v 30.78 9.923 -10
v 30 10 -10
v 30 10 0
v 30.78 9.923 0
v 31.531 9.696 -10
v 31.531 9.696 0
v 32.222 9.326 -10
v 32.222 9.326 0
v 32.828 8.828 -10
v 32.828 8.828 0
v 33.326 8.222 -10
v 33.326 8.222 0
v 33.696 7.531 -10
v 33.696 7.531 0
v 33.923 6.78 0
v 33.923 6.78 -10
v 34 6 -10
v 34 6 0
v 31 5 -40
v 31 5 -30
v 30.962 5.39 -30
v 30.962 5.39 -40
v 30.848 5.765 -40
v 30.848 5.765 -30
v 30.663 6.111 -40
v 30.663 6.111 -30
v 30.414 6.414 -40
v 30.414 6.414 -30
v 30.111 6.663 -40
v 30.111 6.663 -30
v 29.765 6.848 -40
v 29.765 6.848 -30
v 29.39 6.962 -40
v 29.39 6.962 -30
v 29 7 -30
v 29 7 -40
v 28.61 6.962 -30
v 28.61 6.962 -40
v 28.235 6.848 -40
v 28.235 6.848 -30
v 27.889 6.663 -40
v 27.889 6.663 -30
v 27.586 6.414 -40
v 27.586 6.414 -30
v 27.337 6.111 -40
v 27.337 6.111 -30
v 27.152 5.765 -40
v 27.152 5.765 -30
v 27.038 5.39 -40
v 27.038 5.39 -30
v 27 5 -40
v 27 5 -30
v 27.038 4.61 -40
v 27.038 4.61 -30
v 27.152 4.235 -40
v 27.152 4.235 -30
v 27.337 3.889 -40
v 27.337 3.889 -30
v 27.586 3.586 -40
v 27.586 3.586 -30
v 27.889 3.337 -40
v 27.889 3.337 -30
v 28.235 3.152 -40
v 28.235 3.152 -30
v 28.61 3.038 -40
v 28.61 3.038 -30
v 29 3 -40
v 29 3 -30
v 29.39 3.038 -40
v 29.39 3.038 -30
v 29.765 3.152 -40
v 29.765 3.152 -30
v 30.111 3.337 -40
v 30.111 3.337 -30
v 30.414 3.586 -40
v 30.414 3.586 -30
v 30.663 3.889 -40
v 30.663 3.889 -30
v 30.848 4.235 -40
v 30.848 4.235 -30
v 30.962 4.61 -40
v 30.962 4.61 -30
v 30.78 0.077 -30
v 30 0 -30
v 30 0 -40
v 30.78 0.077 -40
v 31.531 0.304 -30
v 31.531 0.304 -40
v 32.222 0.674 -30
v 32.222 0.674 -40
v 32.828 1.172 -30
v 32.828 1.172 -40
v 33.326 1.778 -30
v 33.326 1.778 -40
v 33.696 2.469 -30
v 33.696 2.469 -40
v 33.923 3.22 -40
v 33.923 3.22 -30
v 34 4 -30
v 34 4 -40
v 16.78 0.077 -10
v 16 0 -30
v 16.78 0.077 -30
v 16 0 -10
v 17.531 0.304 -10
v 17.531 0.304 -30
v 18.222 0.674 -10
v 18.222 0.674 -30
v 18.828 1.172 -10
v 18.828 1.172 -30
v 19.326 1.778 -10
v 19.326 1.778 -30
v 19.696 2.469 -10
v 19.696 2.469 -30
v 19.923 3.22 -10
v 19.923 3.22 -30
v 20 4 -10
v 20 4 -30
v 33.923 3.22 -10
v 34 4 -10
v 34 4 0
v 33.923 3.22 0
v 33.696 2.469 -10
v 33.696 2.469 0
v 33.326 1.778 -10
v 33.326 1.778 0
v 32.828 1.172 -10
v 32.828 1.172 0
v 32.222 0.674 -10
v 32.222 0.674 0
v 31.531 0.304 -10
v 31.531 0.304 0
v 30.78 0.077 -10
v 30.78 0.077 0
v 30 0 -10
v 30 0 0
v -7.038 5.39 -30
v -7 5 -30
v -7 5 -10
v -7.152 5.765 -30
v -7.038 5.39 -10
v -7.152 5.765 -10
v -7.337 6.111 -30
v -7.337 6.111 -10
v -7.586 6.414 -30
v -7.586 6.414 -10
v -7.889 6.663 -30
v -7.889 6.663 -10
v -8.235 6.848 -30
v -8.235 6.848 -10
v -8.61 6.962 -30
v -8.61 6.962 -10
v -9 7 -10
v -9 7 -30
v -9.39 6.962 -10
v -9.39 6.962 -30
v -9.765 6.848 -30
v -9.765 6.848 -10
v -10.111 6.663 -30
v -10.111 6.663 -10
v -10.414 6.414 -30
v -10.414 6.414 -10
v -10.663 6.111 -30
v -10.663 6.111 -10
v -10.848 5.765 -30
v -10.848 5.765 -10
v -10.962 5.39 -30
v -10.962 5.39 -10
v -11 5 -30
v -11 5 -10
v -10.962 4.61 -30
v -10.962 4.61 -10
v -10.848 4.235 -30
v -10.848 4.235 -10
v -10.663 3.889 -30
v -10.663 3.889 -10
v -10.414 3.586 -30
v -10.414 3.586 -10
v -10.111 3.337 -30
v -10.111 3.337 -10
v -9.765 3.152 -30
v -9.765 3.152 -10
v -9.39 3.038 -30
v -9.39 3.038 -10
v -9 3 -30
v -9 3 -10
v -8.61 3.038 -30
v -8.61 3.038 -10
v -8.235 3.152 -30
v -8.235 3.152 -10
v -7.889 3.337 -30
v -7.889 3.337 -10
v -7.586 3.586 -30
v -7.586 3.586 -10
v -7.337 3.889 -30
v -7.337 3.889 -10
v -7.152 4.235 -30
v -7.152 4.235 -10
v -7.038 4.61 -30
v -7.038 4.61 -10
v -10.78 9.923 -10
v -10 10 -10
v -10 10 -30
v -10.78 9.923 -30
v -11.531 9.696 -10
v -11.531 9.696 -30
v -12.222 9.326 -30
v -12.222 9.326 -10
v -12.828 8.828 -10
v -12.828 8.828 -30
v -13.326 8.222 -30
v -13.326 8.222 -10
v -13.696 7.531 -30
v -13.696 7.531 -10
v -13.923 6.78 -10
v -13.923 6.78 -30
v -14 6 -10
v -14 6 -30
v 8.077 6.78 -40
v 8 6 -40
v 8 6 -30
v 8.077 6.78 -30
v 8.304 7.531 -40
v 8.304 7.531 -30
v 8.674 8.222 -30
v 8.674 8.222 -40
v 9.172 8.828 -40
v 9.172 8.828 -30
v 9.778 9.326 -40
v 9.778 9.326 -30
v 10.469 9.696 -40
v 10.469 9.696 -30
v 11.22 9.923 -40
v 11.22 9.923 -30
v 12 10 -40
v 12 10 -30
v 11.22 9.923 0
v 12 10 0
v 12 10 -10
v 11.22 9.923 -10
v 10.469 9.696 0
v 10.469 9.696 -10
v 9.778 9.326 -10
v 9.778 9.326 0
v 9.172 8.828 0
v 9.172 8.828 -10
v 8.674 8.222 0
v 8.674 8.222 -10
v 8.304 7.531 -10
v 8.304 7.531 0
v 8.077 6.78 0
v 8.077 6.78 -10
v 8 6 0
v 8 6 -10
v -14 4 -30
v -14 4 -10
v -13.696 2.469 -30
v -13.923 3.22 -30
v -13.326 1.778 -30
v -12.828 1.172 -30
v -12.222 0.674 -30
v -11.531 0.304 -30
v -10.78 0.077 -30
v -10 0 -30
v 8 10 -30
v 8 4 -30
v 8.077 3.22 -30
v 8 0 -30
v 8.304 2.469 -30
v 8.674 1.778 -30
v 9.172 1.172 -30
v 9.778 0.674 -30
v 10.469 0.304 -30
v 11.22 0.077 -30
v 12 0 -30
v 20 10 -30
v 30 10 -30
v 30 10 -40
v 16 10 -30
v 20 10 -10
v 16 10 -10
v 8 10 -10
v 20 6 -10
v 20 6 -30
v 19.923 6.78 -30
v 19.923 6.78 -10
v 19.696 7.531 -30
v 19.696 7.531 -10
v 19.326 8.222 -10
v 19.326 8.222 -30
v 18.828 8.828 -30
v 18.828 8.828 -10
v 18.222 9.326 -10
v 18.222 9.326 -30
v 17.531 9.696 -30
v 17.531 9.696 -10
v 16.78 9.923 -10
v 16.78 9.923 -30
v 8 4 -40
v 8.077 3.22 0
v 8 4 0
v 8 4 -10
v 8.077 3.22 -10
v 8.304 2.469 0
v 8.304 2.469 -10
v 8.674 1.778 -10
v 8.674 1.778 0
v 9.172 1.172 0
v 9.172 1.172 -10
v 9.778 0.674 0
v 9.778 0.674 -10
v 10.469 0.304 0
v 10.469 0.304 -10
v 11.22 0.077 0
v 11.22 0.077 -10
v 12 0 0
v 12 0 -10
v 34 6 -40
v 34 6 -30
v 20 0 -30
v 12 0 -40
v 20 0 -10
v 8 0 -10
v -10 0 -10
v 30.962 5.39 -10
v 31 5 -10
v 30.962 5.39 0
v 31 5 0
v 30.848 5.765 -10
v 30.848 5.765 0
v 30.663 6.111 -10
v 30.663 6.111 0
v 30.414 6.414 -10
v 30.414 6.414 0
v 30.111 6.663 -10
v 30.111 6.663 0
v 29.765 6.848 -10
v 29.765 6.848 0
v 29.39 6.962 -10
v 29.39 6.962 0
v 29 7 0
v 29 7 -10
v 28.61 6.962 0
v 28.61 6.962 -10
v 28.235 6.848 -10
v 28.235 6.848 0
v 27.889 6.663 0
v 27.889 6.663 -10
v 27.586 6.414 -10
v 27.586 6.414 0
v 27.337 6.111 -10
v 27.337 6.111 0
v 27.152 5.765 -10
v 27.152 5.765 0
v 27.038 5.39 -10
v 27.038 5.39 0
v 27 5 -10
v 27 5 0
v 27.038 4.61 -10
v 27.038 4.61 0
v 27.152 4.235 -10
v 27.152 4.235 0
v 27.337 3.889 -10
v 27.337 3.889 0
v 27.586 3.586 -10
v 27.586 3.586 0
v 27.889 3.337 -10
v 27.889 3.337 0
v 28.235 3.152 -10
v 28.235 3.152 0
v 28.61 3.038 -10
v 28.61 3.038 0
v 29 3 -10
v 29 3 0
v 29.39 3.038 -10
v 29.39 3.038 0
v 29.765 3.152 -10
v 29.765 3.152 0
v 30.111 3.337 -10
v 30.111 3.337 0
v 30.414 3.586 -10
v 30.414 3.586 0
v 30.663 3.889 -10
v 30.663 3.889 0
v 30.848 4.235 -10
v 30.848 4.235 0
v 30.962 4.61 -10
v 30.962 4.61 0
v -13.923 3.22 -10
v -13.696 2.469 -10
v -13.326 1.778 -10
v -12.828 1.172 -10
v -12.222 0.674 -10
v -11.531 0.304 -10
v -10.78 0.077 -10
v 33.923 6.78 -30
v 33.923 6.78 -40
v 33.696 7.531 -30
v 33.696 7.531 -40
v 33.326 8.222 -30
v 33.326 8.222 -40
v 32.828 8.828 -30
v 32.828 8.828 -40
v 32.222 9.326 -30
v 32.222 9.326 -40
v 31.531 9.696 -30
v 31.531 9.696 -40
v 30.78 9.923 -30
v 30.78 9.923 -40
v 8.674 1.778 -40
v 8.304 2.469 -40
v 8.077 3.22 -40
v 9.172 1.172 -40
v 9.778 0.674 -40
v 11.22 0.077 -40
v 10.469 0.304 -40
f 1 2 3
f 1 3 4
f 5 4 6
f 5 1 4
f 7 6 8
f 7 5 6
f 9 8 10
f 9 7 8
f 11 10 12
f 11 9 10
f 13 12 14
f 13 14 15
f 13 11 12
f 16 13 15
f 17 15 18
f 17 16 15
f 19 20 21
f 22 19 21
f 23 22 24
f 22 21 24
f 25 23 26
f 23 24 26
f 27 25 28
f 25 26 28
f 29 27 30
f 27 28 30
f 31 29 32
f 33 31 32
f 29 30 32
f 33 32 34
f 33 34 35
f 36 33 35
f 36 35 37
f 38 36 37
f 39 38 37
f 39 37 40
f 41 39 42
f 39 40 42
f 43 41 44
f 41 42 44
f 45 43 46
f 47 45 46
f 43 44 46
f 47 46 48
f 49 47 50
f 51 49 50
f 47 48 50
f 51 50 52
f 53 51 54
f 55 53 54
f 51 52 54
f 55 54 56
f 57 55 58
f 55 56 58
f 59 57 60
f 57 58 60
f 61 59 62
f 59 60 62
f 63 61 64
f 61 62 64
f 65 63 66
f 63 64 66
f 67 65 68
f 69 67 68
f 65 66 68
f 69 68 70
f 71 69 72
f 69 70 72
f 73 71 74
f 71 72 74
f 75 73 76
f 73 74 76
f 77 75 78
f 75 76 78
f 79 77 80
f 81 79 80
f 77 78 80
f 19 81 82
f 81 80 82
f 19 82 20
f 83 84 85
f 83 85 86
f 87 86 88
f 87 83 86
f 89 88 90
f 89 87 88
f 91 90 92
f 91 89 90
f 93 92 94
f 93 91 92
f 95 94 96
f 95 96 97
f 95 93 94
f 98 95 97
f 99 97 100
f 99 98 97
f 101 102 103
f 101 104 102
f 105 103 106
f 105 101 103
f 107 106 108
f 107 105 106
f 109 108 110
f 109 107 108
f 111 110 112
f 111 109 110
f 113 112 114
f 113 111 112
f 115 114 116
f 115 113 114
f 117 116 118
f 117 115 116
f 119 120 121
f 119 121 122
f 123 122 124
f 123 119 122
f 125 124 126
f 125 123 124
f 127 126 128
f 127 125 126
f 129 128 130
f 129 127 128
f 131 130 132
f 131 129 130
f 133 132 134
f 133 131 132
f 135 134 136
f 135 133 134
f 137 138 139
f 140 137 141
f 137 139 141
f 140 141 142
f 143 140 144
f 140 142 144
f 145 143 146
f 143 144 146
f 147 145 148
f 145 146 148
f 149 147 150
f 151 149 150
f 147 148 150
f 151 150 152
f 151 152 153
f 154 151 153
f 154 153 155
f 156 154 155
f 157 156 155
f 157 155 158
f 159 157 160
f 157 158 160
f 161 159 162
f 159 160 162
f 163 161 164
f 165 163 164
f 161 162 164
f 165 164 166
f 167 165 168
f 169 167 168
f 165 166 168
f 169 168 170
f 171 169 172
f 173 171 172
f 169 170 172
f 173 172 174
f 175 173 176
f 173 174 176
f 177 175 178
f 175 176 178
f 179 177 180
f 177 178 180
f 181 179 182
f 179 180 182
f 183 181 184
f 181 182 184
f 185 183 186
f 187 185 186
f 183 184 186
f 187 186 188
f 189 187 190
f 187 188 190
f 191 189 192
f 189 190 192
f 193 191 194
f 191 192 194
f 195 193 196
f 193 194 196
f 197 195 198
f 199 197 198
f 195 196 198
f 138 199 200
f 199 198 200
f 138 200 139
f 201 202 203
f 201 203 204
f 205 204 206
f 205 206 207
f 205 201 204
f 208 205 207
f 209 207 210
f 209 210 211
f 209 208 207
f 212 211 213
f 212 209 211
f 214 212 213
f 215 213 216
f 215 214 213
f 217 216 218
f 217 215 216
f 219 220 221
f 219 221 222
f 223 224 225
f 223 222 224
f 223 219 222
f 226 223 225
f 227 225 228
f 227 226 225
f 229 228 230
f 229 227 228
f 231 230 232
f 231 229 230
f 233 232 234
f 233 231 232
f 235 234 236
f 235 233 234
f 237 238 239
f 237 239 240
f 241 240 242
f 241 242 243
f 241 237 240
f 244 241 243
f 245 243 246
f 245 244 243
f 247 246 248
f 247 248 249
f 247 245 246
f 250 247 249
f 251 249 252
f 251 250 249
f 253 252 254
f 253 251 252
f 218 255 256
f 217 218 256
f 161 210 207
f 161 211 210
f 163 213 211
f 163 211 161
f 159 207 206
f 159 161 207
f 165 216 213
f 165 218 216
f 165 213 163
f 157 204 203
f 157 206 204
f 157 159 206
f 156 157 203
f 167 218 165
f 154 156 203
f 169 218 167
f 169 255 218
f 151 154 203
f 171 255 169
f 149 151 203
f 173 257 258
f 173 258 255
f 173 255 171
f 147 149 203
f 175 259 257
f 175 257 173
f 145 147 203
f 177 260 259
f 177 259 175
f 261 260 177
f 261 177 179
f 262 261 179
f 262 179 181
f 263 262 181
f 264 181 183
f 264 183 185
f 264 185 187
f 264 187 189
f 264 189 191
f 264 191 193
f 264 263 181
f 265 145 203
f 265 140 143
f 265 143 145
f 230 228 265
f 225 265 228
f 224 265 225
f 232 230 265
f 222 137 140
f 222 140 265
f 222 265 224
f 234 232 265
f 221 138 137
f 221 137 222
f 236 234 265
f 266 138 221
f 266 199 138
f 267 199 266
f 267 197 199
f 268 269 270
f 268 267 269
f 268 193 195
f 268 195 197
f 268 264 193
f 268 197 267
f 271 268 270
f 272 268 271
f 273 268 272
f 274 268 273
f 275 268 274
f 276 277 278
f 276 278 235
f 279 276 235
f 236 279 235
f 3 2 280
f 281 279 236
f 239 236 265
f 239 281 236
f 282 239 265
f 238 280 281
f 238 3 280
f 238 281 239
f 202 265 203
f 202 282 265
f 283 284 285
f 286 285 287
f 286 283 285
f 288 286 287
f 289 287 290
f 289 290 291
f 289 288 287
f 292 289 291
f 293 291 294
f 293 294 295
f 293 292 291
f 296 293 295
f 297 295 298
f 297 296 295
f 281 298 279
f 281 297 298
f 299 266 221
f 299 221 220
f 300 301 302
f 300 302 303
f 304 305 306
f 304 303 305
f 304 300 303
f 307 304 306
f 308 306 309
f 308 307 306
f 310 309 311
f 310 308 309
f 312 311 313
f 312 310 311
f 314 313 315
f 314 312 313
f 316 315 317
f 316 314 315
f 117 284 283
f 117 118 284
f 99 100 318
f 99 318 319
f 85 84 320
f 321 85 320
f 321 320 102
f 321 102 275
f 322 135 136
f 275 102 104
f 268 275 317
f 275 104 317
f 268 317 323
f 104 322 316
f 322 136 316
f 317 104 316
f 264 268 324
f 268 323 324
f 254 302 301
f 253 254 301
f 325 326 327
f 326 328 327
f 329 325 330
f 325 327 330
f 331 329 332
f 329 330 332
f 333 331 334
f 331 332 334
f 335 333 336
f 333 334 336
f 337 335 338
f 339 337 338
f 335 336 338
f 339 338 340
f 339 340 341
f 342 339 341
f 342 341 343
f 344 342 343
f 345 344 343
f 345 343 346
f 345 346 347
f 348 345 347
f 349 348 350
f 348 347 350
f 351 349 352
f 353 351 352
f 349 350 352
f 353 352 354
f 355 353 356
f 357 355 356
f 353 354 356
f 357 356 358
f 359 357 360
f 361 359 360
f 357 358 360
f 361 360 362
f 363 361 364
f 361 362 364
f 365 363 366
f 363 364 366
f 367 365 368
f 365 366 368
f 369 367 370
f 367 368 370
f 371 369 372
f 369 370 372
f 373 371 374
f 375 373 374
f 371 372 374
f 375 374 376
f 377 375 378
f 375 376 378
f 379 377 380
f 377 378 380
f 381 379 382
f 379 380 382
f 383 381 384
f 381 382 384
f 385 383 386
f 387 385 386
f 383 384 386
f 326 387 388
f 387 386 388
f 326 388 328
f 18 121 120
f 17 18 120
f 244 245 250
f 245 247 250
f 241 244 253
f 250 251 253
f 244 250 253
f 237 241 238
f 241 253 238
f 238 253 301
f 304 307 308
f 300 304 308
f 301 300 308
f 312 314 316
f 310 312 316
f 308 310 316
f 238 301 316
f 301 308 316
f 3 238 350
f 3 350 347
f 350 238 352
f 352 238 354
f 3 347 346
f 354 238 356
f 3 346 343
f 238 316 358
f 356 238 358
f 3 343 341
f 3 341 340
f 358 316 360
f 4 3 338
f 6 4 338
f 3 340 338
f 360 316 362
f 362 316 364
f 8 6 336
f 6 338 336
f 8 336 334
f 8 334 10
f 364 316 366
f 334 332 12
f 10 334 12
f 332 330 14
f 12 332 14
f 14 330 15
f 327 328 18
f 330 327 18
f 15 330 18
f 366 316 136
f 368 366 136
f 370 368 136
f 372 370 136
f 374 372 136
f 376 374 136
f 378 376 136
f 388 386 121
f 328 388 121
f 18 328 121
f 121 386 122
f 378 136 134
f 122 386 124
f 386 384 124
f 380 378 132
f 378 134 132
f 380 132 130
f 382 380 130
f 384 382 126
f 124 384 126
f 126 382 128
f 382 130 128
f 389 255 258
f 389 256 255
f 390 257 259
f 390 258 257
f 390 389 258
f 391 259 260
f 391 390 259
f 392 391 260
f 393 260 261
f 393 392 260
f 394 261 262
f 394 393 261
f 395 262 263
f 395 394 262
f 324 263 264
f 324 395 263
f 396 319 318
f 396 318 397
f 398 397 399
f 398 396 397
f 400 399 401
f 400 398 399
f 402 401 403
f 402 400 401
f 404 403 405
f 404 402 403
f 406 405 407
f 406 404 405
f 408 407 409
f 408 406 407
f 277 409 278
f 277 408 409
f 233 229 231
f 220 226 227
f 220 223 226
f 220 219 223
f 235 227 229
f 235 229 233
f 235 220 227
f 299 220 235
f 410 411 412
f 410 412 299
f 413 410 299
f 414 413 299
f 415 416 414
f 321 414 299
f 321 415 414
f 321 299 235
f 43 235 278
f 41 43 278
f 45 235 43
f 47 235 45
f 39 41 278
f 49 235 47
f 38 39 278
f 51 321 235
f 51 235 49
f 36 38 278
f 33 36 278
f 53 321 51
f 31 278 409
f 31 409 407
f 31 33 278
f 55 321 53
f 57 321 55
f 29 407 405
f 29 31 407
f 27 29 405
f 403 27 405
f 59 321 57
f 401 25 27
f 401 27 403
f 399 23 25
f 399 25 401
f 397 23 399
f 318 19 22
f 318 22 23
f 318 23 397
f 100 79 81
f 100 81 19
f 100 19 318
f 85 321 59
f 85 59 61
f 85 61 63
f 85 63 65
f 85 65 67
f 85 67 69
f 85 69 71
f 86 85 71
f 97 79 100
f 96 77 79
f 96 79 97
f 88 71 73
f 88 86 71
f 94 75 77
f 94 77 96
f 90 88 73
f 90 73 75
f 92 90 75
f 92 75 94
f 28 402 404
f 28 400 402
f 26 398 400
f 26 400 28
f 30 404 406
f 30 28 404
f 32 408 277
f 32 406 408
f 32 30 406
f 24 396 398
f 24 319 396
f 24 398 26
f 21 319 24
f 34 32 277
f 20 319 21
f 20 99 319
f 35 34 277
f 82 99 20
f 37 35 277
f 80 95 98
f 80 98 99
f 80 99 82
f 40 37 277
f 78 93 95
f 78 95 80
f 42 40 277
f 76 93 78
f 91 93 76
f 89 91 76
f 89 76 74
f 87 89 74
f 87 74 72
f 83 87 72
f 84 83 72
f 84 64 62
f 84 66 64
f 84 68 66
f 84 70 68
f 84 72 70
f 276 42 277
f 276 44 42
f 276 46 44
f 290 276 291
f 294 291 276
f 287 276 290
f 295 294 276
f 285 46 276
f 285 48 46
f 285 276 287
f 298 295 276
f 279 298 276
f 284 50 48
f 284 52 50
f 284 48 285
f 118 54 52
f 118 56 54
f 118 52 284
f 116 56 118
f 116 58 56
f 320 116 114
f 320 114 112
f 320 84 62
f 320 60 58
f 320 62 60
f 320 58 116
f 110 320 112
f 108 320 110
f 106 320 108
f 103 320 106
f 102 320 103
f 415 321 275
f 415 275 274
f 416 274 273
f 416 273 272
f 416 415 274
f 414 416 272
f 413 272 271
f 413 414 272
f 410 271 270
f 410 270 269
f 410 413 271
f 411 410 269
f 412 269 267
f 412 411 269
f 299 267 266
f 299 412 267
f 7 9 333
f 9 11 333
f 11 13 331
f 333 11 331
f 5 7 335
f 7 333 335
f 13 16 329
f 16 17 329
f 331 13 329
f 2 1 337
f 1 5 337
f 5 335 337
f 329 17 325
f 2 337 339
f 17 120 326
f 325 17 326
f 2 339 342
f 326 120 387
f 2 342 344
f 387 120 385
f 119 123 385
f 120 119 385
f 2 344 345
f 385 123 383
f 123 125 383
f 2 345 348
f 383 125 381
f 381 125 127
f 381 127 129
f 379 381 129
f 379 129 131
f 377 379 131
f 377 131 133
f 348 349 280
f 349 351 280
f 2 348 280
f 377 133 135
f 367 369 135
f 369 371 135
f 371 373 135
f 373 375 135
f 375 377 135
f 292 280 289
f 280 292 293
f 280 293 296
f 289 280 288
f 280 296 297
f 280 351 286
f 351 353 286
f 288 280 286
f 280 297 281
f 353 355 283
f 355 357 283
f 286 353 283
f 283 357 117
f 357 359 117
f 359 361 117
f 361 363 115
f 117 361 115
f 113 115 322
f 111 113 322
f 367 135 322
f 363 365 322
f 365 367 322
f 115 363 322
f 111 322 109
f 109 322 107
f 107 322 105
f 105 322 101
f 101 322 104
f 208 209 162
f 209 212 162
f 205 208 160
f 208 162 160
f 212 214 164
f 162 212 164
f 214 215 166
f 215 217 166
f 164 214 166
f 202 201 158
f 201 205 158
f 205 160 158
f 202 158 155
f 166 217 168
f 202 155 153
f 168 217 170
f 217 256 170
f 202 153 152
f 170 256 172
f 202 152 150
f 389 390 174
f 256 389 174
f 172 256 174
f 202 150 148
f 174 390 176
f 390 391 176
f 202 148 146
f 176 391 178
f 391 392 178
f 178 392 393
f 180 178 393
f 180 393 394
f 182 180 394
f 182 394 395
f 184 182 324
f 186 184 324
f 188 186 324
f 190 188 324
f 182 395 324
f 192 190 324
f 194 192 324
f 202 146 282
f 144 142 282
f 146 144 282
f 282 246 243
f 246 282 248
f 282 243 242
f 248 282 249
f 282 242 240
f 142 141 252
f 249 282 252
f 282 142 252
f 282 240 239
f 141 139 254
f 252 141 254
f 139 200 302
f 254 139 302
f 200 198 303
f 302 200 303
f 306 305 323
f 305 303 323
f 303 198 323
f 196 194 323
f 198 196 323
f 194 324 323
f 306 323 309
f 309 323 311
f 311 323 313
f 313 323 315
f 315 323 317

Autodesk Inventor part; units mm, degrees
ref_plane "YZ Plane" through (0, 0, 0) normal (1, 0, 0) x (0, 1, 0)
ref_plane "XZ Plane" through (0, 0, 0) normal (0, 1, 0) x (-1, 0, 0)
ref_plane "XY Plane" through (0, 0, 0) normal (0, 0, 1) x (1, 0, 0)
sketch "arm_sketch" plane through (0, 0, 0) normal (0, 1, 0) x (-1, 0, 0)
  line L0 (0, -40) -> (-20, -40) construction
  line L1 (-20, -40) -> (-20, 0) construction
  line L2 (-20, 0) -> (0, 0) construction
  line L3 (0, 0) -> (0, -40) construction
  line L4 (0, -30) -> (-20, -30) construction
  line L5 (-20, -30) -> (-20, -10)
  line L6 (-20, -10) -> (0, -10) construction
  line L7 (0, -10) -> (0, -30) construction
  line L8 (-20, -40) -> (-34, -40)
  line L9 (-34, -40) -> (-34, -30)
  line L10 (-34, -30) -> (-20, -30)
  line L11 (-20, -30) -> (-20, -40) construction
  line L12 (0, -20) -> (-20, -20) construction
  line L13 (-10, -40) -> (-10, 0) construction
  line L14 (-20, 0) -> (-34, 0)
  line L15 (-34, 0) -> (-34, -10)
  line L16 (-34, -10) -> (-20, -10)
  line L17 (-20, -10) -> (-20, 0) construction
  line L18 (0, -40) -> (14, -40) construction
  line L19 (14, -40) -> (14, -30) construction
  line L20 (14, -30) -> (0, -30)
  line L21 (0, -30) -> (0, -40) construction
  line L22 (0, -10) -> (0, 0) construction
  line L23 (0, 0) -> (14, 0) construction
  line L24 (14, 0) -> (14, -10) construction
  line L25 (14, -10) -> (0, -10)
  line L26 (14, -30) -> (14, -10)
  line L27 (0, -10) -> (-8, -10)
  line L28 (-8, -10) -> (-8, 0)
  line L29 (0, -30) -> (-8, -30)
  line L30 (-8, -30) -> (-8, -40)
  line L31 (-8, -40) -> (-20, -40)
  line L32 (-8, 0) -> (-20, 0)
  point P0 (0, -10)
  point P1 (0, -10)
  dimension "d0" = 20
  dimension "d1" = 40
  dimension "d2" = 20
  dimension "d3" = 10
  dimension "d4" = 14
  dimension "d63" = 12
  dimension "d64" = 12
extrude "arm" add sketch "arm_sketch" along normal blind 10
sketch "Sketch5" plane through (8, 0, 0) normal (0, 0, 1) x (1, 0, 0)
  line L0 (26, 0) -> (26, 10) construction
  line L1 (26, 10) -> (12, 10) construction
  line L2 (-22, 0) -> (-22, 10) construction
  circle A0 centre (21, 5) radius 2
  circle A1 centre (-17, 5) radius 2
  dimension "d66" = 10
  dimension "d67" = 14
  dimension "d68" = 4
  dimension "d69" = 4
  dimension "d70" = 5
  dimension "d71" = 5
  dimension "d72" = 5
  dimension "d73" = 5
extrude "rod_hole" cut sketch "Sketch5" against normal through all
fillet "rot_round" radius 4 12 edges at (-14, 10, -20) (-14, 0, -20) (34, 10, -35) (34, 0, -35) (34, 10, -5) (34, 0, -5) (8, 10, -5) (8, 0, -5) (8, 0, -35) (8, 10, -35) (20, 10, -20) (20, 0, -20)
equation "\"d3\" = 0.5 * d1 - 0.5 * d2"
equation "\"d64\" = d63"
equation "\"d68\" = arm_rod_diam"
equation "\"d69\" = arm_rod_diam"
equation "\"d70\" = d71"
equation "\"d71\" = d72"
equation "\"d72\" = 0.5 * d66"
equation "\"d73\" = d72"
equation "\"d76\" = arm_rod_diam"
equation "\"arm_rod_diam\" = 4"
equation "\"hole\" = 2.2"
properties part number "arm" material "ABS Plastic"
